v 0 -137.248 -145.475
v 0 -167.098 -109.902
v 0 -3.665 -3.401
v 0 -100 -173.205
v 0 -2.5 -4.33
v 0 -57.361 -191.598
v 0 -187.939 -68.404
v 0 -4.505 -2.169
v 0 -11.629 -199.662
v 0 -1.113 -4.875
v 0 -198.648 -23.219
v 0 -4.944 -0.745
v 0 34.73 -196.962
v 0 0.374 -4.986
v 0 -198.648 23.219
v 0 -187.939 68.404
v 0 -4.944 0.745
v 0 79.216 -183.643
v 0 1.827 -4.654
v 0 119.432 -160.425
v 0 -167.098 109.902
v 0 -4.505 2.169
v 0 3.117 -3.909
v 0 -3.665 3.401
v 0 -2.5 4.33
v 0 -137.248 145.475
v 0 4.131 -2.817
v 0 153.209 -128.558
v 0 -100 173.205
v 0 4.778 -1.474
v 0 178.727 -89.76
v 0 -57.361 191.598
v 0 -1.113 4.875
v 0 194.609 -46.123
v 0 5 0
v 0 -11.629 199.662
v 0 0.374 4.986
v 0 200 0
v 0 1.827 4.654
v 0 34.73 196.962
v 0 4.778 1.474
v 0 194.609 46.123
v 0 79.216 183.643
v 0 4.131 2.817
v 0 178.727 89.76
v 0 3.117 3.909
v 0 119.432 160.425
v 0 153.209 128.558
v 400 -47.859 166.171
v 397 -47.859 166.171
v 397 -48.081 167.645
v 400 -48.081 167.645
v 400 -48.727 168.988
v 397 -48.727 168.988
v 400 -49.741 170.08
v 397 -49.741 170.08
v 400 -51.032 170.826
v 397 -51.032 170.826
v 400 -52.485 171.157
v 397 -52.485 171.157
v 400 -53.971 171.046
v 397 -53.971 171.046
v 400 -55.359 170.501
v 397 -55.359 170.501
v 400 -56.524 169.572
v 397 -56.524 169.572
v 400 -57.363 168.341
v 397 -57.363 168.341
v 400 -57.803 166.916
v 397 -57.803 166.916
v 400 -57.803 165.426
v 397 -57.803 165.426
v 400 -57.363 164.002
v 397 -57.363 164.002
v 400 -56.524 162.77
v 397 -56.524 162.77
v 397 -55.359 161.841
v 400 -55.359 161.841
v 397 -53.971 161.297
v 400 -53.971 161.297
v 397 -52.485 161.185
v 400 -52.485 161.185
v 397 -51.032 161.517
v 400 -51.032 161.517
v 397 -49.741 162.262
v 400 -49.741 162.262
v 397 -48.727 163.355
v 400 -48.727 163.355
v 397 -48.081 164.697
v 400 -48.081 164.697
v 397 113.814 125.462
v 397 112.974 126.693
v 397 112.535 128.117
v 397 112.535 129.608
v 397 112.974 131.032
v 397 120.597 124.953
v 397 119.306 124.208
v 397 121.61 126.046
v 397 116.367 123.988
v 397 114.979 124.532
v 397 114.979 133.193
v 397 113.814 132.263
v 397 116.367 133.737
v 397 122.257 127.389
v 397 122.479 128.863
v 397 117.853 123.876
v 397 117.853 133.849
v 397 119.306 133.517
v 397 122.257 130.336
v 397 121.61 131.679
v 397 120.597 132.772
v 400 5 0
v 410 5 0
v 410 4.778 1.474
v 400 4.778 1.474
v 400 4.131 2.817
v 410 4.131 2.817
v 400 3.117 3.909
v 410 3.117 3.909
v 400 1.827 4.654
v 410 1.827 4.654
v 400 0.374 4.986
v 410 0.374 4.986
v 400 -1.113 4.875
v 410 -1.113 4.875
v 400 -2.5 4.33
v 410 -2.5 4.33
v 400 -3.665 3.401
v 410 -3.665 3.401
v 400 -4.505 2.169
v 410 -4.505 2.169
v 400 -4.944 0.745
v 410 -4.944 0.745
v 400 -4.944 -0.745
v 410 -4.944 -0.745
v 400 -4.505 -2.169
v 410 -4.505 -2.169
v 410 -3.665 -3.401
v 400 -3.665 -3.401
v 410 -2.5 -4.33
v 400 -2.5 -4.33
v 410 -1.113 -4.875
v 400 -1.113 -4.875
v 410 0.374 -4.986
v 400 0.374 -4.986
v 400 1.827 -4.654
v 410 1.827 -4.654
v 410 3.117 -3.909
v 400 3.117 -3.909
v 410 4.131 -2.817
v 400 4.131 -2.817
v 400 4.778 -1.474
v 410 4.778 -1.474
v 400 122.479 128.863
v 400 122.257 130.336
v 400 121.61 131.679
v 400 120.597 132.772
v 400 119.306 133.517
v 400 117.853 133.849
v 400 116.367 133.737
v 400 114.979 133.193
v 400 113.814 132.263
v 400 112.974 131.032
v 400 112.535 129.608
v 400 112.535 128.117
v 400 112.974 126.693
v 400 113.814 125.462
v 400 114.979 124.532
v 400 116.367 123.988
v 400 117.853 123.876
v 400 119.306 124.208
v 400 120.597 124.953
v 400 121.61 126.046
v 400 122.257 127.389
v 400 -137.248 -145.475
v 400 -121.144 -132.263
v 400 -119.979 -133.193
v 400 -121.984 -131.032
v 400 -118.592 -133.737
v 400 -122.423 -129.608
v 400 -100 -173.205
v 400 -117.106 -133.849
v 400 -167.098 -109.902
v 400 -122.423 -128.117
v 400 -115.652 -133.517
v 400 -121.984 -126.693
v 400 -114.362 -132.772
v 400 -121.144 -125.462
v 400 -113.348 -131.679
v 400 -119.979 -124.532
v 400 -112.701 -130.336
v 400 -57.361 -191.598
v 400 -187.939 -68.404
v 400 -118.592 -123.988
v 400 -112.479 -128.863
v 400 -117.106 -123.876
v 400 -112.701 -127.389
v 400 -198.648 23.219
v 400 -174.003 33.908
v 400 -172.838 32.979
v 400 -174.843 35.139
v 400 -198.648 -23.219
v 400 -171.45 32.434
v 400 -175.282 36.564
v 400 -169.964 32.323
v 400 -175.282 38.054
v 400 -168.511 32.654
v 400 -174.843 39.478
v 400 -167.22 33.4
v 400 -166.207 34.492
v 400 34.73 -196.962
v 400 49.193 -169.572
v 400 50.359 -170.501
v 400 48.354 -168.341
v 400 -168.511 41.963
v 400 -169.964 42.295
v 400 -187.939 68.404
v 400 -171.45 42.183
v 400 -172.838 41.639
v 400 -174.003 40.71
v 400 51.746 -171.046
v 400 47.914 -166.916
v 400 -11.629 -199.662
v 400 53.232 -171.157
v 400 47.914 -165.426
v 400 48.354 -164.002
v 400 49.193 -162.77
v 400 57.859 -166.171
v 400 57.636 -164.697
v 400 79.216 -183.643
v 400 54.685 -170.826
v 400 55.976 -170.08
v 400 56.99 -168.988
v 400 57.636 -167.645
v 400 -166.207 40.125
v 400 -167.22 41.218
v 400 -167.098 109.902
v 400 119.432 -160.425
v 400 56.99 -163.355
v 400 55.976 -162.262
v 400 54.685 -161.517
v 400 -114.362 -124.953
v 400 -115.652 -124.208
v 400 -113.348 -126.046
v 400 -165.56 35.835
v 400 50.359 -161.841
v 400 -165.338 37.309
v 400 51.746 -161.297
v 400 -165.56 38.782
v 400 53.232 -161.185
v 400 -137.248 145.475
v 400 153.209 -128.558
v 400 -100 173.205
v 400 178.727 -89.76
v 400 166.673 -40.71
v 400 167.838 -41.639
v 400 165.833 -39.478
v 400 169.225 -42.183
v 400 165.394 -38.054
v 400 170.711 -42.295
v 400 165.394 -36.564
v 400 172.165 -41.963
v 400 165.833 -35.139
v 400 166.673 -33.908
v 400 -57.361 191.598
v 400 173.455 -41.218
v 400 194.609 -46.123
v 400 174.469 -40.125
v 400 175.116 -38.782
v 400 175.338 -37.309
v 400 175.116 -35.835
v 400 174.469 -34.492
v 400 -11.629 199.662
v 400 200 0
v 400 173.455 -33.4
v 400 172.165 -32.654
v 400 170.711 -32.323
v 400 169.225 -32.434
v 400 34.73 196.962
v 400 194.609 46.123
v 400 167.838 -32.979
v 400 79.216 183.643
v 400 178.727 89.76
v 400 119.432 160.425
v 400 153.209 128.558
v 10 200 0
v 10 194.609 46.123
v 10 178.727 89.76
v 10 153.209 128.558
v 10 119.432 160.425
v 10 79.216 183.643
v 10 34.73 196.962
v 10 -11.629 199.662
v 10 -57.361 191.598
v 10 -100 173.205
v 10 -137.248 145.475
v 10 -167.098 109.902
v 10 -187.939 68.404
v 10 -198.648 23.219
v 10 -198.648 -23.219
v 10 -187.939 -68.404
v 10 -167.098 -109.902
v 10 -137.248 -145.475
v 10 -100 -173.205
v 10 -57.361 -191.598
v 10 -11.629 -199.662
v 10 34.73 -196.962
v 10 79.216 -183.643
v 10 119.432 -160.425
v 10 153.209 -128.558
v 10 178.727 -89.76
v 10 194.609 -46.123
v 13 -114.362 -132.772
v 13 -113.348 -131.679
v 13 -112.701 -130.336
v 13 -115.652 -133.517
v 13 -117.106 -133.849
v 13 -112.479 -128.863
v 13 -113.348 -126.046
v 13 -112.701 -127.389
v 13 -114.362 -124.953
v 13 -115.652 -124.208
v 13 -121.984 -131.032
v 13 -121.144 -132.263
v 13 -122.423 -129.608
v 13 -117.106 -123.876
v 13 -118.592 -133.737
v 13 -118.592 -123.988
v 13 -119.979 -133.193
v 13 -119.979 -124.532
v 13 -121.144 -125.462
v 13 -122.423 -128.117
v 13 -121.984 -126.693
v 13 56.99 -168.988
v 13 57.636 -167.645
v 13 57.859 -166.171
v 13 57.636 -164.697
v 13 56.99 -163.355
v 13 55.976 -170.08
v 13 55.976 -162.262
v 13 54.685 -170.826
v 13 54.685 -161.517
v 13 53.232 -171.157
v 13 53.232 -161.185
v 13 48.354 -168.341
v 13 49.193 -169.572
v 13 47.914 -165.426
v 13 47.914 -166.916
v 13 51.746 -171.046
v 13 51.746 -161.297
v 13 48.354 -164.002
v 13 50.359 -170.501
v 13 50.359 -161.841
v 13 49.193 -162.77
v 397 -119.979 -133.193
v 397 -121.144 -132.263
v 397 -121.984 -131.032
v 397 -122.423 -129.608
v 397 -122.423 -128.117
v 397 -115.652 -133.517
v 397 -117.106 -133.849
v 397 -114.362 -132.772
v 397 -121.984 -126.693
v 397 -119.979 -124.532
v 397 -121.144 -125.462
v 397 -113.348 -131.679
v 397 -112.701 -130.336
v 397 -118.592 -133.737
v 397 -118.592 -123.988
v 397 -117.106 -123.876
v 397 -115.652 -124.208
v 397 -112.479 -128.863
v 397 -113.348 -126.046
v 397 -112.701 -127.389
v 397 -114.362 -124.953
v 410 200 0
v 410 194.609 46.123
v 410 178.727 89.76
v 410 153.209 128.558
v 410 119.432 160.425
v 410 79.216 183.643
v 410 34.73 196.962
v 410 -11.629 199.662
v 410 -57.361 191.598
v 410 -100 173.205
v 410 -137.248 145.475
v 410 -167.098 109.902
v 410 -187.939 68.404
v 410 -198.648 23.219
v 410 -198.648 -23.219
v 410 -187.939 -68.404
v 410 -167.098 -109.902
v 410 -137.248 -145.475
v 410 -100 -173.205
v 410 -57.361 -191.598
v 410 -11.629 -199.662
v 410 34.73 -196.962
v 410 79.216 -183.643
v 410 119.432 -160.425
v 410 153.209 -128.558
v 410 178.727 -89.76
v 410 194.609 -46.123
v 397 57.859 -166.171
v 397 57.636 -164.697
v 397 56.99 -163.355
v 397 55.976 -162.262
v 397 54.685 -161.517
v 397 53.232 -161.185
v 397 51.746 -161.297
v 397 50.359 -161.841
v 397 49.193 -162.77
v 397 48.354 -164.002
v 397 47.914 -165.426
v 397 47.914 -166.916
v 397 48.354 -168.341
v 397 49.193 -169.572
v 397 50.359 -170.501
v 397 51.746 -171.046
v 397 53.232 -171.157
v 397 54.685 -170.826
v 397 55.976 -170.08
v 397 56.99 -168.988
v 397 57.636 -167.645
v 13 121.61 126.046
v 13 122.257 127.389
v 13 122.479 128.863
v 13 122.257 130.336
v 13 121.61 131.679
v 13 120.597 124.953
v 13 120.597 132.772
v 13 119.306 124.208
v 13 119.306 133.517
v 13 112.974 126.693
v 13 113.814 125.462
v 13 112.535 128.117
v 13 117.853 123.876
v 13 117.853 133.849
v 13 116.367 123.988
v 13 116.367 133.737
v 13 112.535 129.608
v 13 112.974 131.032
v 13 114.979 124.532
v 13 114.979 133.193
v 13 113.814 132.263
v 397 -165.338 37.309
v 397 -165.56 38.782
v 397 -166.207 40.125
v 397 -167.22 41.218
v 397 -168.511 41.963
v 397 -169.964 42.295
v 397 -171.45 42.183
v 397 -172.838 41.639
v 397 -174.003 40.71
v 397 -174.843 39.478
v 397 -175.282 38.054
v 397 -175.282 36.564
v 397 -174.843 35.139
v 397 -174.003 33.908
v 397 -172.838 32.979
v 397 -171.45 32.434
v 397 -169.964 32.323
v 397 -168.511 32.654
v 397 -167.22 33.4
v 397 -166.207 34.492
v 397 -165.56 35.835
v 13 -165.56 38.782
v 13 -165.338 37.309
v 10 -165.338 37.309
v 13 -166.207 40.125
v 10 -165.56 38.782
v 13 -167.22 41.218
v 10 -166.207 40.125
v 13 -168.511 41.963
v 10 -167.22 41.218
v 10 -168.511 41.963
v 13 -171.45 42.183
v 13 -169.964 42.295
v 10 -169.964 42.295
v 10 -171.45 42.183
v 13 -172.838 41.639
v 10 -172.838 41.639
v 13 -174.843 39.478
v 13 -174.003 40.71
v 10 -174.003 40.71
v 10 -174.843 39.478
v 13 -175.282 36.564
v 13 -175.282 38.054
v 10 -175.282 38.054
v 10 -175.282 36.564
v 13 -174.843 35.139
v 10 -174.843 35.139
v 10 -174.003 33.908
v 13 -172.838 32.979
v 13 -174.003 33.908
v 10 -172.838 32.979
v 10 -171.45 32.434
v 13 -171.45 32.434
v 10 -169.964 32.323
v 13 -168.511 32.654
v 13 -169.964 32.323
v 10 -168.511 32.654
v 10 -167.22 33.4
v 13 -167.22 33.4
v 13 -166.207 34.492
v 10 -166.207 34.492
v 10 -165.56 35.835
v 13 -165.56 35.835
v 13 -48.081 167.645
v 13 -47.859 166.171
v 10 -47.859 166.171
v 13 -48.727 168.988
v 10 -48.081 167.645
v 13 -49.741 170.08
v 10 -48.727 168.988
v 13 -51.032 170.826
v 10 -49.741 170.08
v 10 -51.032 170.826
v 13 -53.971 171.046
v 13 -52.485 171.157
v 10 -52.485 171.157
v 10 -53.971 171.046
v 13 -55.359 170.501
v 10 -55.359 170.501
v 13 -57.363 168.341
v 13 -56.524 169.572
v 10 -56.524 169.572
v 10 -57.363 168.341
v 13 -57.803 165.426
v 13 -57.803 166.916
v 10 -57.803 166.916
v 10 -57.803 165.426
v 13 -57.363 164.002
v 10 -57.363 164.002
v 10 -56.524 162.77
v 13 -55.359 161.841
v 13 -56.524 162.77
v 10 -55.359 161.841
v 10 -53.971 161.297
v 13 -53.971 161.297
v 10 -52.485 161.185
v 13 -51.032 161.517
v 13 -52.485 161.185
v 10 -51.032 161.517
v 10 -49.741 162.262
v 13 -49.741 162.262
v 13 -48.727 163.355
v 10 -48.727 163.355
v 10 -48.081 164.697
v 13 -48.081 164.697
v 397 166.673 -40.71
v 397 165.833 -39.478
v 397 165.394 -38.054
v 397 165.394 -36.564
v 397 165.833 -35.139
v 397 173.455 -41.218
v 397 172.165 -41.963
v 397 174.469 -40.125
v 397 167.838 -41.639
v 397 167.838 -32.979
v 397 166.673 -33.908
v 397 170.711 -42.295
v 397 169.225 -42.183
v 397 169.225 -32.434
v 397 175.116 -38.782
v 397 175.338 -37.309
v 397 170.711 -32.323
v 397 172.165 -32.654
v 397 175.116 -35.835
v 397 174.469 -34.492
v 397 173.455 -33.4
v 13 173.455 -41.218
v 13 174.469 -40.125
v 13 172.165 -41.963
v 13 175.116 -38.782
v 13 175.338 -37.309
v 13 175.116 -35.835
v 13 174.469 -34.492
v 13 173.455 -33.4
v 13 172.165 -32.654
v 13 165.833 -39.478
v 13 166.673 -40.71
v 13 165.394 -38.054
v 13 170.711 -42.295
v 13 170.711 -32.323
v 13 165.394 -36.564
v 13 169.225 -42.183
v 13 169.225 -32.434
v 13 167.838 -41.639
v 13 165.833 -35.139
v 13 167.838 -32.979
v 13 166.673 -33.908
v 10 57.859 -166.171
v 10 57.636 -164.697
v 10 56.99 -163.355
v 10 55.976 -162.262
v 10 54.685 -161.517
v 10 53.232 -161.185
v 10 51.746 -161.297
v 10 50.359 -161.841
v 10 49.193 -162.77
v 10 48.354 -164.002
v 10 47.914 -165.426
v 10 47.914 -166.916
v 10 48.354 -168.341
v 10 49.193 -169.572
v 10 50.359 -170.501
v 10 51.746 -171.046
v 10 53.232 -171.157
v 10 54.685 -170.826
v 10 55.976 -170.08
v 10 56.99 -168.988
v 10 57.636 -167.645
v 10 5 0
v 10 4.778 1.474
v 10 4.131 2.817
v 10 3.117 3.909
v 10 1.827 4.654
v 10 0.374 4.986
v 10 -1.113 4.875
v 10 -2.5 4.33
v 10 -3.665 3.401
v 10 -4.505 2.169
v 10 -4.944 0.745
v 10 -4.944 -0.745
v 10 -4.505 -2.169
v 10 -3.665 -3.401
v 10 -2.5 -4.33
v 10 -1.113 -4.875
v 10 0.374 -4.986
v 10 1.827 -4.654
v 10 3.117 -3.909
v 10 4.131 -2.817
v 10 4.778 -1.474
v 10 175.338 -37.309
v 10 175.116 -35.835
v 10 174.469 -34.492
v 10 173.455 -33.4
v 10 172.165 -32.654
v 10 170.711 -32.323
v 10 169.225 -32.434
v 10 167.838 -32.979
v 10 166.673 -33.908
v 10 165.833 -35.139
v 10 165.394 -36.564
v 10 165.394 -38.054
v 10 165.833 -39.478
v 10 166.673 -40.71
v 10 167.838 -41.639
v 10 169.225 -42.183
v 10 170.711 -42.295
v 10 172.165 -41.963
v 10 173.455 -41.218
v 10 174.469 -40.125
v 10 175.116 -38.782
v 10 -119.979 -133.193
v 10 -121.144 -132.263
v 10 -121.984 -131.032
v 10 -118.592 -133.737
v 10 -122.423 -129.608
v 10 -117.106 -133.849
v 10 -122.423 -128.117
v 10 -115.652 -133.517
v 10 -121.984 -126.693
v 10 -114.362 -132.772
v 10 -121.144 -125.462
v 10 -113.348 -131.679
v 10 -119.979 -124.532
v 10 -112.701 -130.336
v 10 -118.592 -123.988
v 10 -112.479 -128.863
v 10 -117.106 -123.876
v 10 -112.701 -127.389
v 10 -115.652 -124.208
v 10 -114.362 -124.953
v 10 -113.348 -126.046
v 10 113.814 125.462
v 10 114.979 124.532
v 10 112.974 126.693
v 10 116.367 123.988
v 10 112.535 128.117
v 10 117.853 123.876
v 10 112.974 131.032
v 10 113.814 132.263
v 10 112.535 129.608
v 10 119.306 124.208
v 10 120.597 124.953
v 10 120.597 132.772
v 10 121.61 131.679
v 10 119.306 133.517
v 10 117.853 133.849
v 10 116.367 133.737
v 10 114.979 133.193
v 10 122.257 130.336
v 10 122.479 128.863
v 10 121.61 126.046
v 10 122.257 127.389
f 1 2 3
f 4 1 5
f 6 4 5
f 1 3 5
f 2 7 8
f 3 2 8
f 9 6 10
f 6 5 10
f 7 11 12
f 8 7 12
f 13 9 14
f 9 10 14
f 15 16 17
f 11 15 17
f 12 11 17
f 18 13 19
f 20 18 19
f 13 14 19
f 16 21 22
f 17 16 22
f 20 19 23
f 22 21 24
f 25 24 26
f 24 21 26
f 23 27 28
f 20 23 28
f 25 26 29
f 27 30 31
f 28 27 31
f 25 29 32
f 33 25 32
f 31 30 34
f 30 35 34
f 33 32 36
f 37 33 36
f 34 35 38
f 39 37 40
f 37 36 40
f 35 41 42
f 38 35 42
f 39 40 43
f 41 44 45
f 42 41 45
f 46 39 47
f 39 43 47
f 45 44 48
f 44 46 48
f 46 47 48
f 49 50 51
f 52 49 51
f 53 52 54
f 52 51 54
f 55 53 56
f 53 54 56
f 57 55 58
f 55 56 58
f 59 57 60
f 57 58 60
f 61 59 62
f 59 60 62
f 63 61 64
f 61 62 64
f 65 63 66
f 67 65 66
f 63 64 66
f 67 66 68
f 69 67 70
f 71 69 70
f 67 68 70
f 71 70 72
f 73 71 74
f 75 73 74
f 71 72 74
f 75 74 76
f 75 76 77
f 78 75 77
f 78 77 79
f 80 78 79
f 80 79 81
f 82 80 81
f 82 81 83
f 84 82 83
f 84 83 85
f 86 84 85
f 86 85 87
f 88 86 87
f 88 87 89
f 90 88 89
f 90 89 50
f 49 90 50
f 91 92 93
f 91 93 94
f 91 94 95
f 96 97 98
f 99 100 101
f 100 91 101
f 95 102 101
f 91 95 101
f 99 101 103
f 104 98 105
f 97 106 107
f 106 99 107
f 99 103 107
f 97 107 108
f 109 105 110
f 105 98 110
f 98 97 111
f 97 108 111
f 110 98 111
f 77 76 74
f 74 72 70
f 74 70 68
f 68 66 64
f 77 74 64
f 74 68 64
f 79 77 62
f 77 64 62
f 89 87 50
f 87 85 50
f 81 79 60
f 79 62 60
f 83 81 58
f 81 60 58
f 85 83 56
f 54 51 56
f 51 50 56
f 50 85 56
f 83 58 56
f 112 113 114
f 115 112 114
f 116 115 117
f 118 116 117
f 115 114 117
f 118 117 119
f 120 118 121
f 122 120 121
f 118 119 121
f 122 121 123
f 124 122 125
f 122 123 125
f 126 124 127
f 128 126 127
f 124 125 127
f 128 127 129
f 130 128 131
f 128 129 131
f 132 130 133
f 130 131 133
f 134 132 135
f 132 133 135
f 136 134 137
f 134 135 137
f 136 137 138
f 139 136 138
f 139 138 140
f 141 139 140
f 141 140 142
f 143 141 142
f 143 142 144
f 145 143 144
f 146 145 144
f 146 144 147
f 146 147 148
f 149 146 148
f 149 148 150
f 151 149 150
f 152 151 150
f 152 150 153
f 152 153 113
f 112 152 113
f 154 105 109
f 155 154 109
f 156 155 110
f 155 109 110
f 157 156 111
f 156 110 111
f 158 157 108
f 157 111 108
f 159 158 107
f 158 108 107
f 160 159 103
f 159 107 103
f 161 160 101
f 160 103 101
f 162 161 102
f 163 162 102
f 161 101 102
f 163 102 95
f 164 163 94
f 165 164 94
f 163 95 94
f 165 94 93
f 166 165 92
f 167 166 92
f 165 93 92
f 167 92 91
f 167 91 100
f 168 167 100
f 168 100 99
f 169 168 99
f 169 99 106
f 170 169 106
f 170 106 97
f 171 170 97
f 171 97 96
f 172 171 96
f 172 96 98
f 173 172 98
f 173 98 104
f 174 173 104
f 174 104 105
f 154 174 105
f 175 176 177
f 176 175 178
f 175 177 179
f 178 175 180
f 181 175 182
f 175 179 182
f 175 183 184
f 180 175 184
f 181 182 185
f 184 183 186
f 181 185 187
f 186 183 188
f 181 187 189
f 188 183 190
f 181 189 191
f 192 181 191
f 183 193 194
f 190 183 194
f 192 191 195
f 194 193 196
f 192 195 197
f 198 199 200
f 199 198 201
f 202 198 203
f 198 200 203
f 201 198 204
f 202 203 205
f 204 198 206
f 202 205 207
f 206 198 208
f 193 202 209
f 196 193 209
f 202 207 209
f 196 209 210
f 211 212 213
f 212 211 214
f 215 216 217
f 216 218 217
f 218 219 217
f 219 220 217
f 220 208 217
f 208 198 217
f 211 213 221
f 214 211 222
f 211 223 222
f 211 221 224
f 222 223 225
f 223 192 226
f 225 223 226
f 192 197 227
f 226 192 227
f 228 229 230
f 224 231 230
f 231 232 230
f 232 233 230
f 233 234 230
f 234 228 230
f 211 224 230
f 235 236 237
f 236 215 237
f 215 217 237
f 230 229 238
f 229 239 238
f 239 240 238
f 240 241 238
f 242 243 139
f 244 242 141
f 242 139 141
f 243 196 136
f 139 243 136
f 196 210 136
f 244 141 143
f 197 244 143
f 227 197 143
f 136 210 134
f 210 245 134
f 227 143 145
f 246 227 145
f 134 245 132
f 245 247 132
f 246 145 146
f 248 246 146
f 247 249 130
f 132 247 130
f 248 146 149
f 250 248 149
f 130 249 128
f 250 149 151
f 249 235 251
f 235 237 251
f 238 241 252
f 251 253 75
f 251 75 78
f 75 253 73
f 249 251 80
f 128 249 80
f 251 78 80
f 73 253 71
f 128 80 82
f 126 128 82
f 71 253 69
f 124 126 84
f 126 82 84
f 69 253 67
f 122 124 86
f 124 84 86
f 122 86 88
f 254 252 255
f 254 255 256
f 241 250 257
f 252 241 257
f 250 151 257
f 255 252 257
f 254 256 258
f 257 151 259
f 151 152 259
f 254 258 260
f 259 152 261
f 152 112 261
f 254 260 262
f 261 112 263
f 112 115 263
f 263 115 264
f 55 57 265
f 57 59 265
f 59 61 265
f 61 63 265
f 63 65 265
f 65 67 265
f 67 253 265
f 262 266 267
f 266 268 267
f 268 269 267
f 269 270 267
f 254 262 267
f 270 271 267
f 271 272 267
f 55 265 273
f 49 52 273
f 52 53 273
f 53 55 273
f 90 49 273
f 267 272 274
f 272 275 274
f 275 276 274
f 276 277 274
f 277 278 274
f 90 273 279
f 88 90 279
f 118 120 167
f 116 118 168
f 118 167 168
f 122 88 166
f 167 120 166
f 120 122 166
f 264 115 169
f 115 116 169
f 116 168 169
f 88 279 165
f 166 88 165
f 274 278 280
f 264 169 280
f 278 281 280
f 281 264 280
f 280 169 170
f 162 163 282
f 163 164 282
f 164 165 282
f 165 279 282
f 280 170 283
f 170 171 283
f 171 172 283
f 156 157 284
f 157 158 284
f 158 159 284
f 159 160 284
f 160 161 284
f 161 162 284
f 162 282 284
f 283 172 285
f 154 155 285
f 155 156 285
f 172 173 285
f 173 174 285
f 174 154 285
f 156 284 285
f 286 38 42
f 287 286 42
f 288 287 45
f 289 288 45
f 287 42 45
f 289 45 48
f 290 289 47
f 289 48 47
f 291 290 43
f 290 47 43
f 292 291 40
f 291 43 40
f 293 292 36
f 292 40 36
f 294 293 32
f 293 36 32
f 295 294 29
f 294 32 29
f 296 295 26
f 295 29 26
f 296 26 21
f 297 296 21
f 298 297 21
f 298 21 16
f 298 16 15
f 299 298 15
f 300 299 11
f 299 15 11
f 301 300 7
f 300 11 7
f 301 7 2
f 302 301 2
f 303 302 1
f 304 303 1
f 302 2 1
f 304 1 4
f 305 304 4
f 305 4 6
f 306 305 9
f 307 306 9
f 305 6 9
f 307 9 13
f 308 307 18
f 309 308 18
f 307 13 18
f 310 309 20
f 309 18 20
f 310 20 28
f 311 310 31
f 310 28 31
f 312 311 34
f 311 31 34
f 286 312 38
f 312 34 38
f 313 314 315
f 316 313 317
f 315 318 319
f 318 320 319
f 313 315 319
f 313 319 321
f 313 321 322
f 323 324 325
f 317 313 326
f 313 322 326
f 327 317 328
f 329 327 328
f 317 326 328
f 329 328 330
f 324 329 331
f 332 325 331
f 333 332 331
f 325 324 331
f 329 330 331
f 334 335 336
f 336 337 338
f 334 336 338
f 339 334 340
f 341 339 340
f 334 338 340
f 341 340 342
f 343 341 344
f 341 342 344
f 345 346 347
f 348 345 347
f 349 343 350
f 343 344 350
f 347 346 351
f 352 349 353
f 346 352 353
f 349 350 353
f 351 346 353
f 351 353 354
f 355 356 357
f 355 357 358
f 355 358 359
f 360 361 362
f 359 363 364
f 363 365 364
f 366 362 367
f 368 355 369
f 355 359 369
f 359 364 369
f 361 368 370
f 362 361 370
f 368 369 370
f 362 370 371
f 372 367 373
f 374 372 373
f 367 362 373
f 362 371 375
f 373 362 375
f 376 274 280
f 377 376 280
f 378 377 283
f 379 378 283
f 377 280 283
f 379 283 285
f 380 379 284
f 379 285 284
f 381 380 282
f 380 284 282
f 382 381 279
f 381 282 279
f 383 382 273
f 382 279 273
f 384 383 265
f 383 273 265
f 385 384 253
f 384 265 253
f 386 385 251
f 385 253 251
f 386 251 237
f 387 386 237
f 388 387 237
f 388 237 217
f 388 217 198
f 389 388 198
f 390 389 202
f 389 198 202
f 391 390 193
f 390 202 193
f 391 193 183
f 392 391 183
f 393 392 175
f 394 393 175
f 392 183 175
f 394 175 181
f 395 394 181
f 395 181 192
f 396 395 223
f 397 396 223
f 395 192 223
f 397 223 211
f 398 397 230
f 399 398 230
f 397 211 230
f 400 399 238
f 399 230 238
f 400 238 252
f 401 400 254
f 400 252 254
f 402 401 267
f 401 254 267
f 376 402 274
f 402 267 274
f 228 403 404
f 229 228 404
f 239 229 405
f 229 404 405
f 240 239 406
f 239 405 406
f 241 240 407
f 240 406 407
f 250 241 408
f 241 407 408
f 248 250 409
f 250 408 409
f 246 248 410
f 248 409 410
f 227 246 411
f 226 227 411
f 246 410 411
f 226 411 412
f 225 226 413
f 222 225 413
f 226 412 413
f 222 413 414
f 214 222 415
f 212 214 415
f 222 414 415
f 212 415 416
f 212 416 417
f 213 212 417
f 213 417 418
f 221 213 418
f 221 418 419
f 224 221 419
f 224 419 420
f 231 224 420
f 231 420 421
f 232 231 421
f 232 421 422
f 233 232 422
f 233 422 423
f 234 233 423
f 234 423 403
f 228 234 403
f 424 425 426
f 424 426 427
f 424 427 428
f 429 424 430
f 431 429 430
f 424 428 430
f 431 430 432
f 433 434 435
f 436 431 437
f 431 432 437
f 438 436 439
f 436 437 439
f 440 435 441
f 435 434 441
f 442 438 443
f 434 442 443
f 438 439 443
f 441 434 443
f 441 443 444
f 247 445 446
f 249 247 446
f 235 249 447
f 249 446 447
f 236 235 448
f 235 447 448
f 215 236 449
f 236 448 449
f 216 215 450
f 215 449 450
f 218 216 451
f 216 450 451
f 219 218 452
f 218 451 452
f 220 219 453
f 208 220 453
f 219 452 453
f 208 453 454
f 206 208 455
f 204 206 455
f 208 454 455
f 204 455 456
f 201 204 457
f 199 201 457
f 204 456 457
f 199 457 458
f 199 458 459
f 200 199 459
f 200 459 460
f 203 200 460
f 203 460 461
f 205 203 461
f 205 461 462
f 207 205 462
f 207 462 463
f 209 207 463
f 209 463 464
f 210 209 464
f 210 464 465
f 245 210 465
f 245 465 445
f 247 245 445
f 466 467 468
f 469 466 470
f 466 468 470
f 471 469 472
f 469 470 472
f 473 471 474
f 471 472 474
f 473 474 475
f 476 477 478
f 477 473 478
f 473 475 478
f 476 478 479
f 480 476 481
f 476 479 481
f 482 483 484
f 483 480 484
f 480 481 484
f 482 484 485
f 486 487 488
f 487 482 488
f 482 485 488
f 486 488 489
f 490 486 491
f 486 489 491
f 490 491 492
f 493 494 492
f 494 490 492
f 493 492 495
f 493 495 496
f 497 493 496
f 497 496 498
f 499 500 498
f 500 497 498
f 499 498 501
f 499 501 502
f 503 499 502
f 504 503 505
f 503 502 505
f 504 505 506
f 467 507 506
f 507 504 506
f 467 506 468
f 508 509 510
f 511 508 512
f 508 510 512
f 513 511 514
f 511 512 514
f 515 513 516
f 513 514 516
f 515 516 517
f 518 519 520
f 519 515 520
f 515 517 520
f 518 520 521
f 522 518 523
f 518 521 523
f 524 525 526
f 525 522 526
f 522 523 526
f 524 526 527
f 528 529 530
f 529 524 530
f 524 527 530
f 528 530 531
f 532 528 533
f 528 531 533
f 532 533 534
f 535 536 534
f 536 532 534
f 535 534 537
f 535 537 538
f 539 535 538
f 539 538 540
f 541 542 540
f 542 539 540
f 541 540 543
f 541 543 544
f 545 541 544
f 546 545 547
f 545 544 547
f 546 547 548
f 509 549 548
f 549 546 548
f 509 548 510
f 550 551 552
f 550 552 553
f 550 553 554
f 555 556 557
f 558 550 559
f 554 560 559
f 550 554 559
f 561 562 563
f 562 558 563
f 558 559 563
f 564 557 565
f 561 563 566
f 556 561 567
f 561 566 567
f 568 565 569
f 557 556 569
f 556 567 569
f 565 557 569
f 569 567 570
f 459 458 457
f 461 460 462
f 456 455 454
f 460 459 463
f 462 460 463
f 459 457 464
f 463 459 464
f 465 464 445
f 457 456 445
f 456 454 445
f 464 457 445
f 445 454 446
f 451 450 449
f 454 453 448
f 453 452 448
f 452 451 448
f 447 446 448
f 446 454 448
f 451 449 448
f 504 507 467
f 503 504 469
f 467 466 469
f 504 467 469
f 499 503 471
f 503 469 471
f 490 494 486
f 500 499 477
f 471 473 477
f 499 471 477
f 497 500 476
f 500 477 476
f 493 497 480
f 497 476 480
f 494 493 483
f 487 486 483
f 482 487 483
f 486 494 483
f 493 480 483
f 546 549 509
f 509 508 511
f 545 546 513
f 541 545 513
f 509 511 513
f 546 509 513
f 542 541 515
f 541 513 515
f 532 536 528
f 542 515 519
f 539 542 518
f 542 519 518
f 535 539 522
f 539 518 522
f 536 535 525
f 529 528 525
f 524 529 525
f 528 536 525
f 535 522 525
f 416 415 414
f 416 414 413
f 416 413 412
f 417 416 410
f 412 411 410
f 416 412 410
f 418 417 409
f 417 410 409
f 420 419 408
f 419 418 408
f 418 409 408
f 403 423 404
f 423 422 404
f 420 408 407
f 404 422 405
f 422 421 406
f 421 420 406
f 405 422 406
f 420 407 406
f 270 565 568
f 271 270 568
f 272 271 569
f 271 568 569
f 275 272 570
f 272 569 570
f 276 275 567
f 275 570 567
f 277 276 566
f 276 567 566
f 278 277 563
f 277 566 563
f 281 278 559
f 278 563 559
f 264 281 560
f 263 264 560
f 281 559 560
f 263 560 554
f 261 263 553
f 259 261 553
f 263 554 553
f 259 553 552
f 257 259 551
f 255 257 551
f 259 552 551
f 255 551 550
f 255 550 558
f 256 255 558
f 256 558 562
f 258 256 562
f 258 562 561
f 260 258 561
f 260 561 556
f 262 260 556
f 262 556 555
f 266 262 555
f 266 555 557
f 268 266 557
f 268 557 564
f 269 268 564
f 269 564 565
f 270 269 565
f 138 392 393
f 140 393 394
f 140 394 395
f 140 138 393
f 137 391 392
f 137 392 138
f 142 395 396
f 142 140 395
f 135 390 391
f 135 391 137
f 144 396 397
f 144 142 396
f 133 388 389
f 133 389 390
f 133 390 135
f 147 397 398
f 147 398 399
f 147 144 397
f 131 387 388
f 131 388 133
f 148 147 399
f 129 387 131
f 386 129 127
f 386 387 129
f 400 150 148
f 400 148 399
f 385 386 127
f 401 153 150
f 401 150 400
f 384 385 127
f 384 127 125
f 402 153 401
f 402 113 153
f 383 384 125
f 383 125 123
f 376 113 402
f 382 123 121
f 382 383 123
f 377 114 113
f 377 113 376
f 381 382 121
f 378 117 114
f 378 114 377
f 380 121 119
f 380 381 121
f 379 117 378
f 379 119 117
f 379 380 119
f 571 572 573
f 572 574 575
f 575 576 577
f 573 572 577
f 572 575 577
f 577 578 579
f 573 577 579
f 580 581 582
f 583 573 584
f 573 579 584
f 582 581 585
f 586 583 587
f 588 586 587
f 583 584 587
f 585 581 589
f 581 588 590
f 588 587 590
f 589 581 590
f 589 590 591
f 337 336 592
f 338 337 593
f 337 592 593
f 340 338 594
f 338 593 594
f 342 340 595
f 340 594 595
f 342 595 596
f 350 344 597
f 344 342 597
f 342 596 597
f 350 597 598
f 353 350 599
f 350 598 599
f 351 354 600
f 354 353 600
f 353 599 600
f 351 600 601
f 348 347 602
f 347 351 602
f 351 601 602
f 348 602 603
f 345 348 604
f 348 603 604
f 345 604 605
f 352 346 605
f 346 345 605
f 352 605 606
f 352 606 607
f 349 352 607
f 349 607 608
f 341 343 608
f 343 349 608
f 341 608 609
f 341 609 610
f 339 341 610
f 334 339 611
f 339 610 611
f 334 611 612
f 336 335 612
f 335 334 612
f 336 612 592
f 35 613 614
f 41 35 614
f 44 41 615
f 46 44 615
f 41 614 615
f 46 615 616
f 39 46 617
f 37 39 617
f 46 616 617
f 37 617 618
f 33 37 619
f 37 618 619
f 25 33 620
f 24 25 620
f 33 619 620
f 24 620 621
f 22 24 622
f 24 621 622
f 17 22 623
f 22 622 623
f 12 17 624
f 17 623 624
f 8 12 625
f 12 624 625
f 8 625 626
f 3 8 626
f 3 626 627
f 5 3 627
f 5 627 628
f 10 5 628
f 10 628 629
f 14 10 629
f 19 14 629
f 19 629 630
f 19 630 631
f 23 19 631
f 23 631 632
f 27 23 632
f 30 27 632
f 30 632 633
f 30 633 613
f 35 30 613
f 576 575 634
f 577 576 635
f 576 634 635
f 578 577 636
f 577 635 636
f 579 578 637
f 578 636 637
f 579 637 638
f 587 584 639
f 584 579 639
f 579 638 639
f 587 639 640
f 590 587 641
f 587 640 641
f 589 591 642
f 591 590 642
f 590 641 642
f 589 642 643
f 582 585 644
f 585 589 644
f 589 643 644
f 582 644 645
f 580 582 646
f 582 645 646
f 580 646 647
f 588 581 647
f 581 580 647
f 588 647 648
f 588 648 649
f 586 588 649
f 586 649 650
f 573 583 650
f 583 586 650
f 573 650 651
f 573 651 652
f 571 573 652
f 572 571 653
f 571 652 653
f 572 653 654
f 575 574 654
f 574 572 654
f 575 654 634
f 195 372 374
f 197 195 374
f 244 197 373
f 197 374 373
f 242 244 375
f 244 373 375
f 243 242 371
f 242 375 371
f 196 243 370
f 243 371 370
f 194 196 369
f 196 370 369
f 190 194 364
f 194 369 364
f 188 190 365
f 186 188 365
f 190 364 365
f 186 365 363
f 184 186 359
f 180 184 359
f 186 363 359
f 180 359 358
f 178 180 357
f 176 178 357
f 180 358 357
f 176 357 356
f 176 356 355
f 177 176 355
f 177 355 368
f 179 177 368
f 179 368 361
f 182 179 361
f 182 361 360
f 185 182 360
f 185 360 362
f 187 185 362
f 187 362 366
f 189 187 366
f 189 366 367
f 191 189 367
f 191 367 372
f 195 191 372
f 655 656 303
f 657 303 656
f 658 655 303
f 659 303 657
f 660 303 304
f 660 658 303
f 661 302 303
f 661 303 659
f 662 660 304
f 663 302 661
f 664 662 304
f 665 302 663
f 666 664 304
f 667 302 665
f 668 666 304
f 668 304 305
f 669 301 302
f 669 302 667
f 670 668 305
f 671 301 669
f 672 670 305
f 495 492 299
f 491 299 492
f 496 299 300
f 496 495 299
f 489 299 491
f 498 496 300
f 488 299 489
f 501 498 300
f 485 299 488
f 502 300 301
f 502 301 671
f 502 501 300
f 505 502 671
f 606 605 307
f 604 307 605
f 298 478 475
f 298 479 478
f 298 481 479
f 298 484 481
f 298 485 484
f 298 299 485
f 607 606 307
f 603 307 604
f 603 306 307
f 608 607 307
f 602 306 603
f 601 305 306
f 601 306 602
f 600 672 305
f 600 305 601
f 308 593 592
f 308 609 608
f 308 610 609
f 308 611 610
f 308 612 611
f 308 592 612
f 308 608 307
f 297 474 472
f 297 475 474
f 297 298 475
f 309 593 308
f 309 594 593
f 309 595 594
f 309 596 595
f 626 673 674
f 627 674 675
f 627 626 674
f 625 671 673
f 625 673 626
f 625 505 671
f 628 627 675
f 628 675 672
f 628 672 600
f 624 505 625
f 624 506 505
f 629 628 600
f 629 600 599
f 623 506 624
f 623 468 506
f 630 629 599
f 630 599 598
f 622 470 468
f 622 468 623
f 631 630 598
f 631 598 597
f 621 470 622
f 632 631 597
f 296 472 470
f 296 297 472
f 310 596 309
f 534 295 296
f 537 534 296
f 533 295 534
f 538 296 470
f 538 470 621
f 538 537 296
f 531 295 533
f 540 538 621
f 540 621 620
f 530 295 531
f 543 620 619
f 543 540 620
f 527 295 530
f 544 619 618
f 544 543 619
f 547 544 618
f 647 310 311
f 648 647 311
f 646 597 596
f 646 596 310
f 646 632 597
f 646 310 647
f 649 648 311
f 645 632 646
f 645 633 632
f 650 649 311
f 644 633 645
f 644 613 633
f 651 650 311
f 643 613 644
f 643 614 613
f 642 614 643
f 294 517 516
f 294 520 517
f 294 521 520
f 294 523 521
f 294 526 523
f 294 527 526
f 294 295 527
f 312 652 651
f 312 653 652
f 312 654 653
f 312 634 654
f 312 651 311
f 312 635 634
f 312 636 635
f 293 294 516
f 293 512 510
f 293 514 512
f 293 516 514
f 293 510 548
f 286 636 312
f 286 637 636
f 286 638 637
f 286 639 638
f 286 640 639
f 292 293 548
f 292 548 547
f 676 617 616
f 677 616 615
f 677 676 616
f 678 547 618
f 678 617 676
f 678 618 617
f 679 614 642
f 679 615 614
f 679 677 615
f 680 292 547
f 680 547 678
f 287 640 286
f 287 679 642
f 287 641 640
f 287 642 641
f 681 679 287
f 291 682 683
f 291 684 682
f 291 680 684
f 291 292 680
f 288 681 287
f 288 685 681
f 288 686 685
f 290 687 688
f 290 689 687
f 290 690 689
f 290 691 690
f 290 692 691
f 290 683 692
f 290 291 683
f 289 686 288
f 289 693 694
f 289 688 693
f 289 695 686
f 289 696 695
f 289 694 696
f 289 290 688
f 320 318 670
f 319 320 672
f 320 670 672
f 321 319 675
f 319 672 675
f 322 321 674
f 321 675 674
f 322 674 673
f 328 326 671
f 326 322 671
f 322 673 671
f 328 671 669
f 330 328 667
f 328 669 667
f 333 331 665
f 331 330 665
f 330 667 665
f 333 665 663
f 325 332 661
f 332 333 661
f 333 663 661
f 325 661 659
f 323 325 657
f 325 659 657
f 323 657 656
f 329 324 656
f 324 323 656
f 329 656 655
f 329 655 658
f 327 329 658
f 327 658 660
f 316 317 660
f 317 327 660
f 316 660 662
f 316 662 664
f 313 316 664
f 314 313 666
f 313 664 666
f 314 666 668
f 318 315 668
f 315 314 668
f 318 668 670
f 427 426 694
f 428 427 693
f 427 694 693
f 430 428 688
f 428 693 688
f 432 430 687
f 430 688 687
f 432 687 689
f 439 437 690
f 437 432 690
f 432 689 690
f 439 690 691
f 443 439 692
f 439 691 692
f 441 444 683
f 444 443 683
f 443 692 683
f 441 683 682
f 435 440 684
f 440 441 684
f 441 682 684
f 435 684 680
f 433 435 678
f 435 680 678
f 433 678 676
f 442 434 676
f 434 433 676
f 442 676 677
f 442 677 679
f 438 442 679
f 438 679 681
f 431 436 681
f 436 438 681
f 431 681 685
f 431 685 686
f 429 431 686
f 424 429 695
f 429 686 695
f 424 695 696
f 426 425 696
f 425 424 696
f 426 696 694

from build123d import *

# Parameters (mm, degrees)
F0_R     = 5
F1_DEPTH = 400
F0_R_2   = 200
F2_DEPTH = 10
F3_R     = 200
F4_DEPTH = 10
F5_R     = 5
F6_DEPTH = 3000
F7_W     = 384
F7_H     = 600
F7_H_2   = 222.5099402733
F8_DEPTH = 200


with BuildPart() as f1:
    # F0 (on Right) → F1 (new body)
    with BuildSketch(Plane.YZ):
        with Locations((52.8585985303, -166.1712229252)):
            Circle(F0_R)
    extrude(amount=F1_DEPTH)



with BuildPart() as f1b:
    # F0 (on Right) → F1, piece 2 (new body)
    with BuildSketch(Plane.YZ):
        with Locations((-117.479201166, -128.8625005983)):
            Circle(F0_R)
    extrude(amount=F1_DEPTH)


with BuildPart() as f1c:
    # F0 (on Right) → F1, piece 3 (new body)
    with BuildSketch(Plane.YZ):
        with Locations((-170.3377996963, 37.3087223269)):
            Circle(F0_R)
    extrude(amount=F1_DEPTH)


with BuildPart() as f1d:
    # F0 (on Right) → F1, piece 4 (new body)
    with BuildSketch(Plane.YZ):
        with Locations((-52.8585985303, 166.1712229252)):
            Circle(F0_R)
    extrude(amount=F1_DEPTH)


with BuildPart() as f1e:
    # F0 (on Right) → F1, piece 5 (new body)
    with BuildSketch(Plane.YZ):
        with Locations((170.3377996963, -37.3087223269)):
            Circle(F0_R)
    extrude(amount=F1_DEPTH)


with BuildPart() as f1f:
    # F0 (on Right) → F1, piece 6 (new body)
    with BuildSketch(Plane.YZ):
        with Locations((117.479201166, 128.8625005983)):
            Circle(F0_R)
    extrude(amount=F1_DEPTH)


with BuildPart() as f1_1:
    add(f1.part)

    add(f1b.part)  # F2 merges F1b

    add(f1c.part)  # F2 merges F1c

    add(f1d.part)  # F2 merges F1d

    add(f1e.part)  # F2 merges F1e

    add(f1f.part)  # F2 merges F1f
    # F0 (on Right) → F2 (join)
    with BuildSketch(Plane.YZ):
        Circle(F0_R_2)
        with Locations((-117.479201166, -128.8625005983)):
            Circle(F0_R, mode=Mode.SUBTRACT)
        with Locations((52.8585985303, -166.1712229252)):
            Circle(F0_R, mode=Mode.SUBTRACT)
        with Locations((170.3377996963, -37.3087223269)):
            Circle(F0_R, mode=Mode.SUBTRACT)
        with Locations((-170.3377996963, 37.3087223269)):
            Circle(F0_R, mode=Mode.SUBTRACT)
        with Locations((-52.8585985303, 166.1712229252)):
            Circle(F0_R, mode=Mode.SUBTRACT)
        with Locations((117.479201166, 128.8625005983)):
            Circle(F0_R, mode=Mode.SUBTRACT)
    extrude(amount=F2_DEPTH)

    # F3 (on face) → F4 (join)
    with BuildSketch(Plane.YZ.offset(400)):
        Circle(F3_R)
    extrude(amount=F4_DEPTH)

    # F5 (on face) → F6 (cut)
    with BuildSketch(Plane.YZ.offset(410)):
        Circle(F5_R)
    extrude(amount=-F6_DEPTH, mode=Mode.SUBTRACT)

    # F7 (on Top) → F8 (cut, symmetric)
    with BuildSketch(Plane.XY):
        with Locations((205, 254.5201855965)):
            Rectangle(F7_W, F7_H)
        with Locations((205, -156.7347845402)):
            Rectangle(F7_W, F7_H_2)
    extrude(amount=F8_DEPTH, both=True, mode=Mode.SUBTRACT)


solid = f1_1.part
